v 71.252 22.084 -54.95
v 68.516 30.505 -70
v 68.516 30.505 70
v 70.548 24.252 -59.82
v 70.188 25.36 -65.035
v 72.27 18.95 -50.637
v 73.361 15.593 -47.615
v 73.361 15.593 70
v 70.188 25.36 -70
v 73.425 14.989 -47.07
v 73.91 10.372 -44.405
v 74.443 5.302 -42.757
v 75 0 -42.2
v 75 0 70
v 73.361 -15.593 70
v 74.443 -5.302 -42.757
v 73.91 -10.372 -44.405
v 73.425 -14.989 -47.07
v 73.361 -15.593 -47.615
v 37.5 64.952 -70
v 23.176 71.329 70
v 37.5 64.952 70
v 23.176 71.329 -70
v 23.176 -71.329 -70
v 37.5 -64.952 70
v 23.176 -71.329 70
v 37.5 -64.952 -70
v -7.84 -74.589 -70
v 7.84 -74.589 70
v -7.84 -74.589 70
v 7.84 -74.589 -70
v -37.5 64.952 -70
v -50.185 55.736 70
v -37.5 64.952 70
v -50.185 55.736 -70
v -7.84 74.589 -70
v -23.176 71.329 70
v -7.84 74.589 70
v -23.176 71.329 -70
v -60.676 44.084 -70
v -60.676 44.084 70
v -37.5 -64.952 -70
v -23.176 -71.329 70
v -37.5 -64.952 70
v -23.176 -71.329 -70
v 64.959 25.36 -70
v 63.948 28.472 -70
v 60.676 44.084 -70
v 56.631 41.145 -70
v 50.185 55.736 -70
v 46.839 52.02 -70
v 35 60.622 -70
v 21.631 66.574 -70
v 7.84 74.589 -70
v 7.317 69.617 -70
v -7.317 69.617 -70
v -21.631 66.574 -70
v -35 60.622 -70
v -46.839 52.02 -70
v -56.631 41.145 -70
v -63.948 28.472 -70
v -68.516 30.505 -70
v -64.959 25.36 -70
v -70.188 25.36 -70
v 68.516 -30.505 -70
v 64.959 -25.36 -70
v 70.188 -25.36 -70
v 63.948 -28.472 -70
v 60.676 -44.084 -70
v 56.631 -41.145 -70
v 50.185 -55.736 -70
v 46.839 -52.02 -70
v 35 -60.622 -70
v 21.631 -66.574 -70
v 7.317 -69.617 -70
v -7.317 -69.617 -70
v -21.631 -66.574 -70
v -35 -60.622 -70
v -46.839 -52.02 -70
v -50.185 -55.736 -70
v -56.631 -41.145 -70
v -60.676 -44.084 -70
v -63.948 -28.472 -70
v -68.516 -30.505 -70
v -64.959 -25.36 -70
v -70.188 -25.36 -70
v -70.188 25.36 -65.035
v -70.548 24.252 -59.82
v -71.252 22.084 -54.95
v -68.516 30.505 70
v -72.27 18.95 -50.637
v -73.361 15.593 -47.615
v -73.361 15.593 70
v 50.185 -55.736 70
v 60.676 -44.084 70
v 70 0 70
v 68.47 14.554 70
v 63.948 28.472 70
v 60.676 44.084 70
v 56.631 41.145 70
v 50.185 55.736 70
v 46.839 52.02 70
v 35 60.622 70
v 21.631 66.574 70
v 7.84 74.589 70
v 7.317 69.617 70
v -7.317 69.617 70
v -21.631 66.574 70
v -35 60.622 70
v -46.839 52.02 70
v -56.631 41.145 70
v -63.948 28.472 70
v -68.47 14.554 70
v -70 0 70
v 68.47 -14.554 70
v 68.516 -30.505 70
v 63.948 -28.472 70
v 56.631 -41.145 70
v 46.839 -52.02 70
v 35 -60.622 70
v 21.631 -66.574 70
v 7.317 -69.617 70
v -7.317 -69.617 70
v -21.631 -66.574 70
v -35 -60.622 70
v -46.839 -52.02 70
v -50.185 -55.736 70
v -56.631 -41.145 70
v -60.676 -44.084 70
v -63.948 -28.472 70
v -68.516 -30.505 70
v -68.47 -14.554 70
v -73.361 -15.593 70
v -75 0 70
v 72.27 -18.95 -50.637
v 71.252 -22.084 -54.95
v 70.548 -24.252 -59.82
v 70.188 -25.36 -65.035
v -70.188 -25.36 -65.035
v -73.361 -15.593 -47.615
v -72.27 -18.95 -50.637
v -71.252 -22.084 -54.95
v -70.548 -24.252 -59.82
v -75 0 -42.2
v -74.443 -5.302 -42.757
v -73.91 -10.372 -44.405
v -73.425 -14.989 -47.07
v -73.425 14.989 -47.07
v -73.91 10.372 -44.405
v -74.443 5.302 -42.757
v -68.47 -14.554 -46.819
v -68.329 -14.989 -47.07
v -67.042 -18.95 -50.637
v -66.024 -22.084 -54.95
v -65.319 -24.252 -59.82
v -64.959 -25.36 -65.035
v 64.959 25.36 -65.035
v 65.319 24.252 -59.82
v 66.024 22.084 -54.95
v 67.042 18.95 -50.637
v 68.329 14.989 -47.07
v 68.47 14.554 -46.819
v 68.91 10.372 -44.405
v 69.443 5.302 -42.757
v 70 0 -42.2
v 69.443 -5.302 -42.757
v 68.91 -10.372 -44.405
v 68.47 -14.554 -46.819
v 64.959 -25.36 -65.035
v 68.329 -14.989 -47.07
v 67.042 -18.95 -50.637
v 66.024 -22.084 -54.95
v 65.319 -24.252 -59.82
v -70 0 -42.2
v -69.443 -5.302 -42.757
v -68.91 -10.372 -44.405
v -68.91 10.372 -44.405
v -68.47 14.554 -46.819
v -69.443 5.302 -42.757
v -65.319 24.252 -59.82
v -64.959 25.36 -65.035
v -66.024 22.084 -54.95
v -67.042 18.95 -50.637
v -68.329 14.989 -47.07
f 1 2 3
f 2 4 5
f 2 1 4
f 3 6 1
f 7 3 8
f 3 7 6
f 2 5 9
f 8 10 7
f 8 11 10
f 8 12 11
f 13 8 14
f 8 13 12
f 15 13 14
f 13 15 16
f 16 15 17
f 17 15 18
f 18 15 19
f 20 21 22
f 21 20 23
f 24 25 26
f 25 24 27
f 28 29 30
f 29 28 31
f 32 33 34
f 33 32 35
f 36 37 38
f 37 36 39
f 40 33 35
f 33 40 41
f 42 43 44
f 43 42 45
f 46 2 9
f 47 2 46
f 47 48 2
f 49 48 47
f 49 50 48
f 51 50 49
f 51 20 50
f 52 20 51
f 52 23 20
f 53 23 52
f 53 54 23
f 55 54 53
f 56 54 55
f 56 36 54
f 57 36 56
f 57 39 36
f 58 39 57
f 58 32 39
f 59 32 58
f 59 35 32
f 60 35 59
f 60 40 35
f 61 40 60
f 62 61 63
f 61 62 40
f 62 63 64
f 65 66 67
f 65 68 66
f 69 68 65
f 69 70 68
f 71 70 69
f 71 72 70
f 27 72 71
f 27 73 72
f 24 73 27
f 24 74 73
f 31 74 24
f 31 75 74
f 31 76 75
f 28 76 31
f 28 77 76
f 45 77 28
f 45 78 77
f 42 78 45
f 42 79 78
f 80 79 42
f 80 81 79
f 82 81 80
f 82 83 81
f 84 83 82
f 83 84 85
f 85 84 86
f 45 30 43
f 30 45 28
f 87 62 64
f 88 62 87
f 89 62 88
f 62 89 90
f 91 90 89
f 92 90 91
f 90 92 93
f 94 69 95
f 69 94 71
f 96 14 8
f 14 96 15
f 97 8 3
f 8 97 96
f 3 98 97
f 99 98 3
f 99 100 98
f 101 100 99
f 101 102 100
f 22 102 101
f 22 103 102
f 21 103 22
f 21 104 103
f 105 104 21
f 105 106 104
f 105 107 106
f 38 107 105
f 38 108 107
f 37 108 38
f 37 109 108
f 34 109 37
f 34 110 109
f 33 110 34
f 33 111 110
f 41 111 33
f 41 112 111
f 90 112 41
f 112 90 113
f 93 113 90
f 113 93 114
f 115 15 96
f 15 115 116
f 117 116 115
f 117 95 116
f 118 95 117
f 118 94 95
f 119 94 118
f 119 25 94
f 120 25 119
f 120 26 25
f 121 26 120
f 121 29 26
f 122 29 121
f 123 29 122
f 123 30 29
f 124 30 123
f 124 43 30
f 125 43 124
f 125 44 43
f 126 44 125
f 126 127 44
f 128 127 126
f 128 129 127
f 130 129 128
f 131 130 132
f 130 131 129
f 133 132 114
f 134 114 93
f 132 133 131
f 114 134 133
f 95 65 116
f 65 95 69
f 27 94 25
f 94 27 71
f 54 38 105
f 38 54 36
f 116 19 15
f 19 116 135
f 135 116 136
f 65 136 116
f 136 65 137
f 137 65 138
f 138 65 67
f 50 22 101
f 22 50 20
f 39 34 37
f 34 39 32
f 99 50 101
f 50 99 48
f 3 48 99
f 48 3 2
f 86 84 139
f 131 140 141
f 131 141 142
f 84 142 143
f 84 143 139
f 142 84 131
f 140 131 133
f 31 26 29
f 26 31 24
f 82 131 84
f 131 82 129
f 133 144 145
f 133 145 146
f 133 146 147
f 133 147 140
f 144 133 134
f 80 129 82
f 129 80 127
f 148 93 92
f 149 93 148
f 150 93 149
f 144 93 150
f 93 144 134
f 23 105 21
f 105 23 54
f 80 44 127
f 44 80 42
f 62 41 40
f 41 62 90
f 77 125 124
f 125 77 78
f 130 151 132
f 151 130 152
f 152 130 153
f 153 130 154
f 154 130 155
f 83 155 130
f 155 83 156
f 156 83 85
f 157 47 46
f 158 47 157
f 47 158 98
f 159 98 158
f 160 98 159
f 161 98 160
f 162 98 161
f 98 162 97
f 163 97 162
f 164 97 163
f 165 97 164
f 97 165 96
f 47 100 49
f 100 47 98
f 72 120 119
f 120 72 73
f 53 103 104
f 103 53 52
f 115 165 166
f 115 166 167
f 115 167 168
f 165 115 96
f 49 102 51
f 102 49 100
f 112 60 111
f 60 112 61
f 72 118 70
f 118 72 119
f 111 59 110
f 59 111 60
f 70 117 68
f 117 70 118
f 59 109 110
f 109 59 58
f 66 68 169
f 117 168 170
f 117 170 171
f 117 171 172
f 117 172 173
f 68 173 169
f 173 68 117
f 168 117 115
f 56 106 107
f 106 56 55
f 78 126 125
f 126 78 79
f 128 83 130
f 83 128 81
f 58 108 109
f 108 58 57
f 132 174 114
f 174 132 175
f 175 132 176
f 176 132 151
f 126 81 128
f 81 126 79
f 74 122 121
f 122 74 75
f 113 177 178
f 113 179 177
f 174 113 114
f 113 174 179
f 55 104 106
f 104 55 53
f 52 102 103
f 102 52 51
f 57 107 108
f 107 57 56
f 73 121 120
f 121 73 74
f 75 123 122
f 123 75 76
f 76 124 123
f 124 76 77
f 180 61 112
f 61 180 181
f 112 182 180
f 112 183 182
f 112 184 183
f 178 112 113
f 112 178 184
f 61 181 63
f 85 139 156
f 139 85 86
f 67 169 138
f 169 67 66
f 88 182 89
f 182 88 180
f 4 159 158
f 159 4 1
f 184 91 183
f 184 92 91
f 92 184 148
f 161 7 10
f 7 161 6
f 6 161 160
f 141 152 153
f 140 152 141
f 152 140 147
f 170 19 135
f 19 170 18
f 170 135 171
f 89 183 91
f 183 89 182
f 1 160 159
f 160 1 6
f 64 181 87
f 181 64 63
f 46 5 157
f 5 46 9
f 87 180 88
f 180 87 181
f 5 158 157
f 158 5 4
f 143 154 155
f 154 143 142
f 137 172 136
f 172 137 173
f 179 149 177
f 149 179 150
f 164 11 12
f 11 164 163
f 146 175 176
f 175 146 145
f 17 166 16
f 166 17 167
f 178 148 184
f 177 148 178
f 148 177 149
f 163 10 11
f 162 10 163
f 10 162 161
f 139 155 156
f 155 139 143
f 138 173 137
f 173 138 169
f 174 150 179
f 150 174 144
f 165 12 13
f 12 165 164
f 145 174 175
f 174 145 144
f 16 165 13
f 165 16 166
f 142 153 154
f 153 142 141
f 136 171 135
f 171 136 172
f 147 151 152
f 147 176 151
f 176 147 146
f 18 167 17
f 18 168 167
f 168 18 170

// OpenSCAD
// file: settings.scad
// Common settings used by all scad files.

// ALL UNITS IN MILLIMETERS (MM)!!!

$fn = 30;//low-res but fast to render
//$fn = 50;//higher-res but slow to render

pi = 3.1415926535897932384626433832795;

max_footprint = 150; // 15x15 cm

bottom_clearance = 10;
bottom_clearance = 25.4/2+10;
//bottom_clearance = 30;

shell_alpha = 0.215;
//shell_alpha = 1.0;

tolerance = 0.5;

// Flat countersunk M2.5mm x 0.45mm machine screw.
screw_thread_diameter = 2.5;//2.8;//2.75;//2.4?
screw_thread_length = 5;//?
screw_head_diameter = 4.75; // M2.5
//screw_head_diameter = 5.2; // M3
screw_head_height = 1.5;//2;

screw_thread_diameter2 = 2;

unit_thickness = 5;
u = unit_thickness;

shell_thickness = unit_thickness;

// Show flags.
show_platform = 0;
show_head = 1;
show_head_shell = 0;
show_head_electronics_bb = 0;
show_battery = 1;
show_foot_cube = 0;
show_torso = 0;
show_motor = 0;
show_motor_plates = 1;
show_motor_inner_plates = 1;
show_motor_outer_plates = 1;
show_wheel = 0;//obsolete
show_tracks = 1;//
show_track_wheels = 1;
show_caster = 0;
show_rpi = 1;
show_vertical_plates = 1;//
show_horizontal_plates = 1;//
show_caster_plates = 0;//obsolete?
show_camera = 1;
show_screen = 0;
show_edge_mount = 1;
show_sonar_mount = 1;
show_recharge_mount = 1;
show_conduit = 1;
show_torso_shell = 1;
show_recharge_dock = 0;
show_head_tilt_axis = 0;
show_rpi_camera_axis = 0;
show_laser_axis = 0;

head_vertical_angle_tilt = 0;
//head_vertical_angle_tilt = 30;//max
//head_vertical_angle_tilt = 10;

torso_height = 120+20;

base_plate_diameter = max_footprint-unit_thickness*2;
base_plate_frame = 0;

head_height = 50;
head_offset_z = max_footprint/2;
head_middle_cutout = 85;

rpi_with_four_hats_and_clearance = 76;

qrd1114_w = 6.10;
qrd1114_l = 4.39;
qrd1114_h = 4.65;

dock_radius = 10;
dock_gripper_border = 2;
dock_gripper_instep = 0.9;
dock_gripper_cutout_tapper = 50;
dock_receiver_height = 5;

// Patriod Fuel+ 9000 mAh
battery_length = 90;
battery_width = 57;
battery_height = 23;
battery_offset_z = 30;//4;

wheel_diameter = 50;
wheel_offset_x = 65;
wheel_offset_z = wheel_diameter/2;
wheel_axle_diameter = 5;

//caster_diameter = 19.05; // 0.75 inches
caster_diameter = 25.45; // 1 inches
//caster_diameter = 15.875; // 5/8 inches
caster_holder_diameter = 30;//31;
caster_offset_y = base_plate_diameter/2 - caster_holder_diameter/2;

arduino_offset_x = 0;
arduino_offset_y = 0;
arduino_offset_z = 67;
arduino_offset_x2 = 0;
arduino_offset_y2 = -20;
arduino_offset_z2 = torso_height+bottom_clearance;

horizontal_plate_width = unit_thickness*8*2 - unit_thickness*2;
horizontal_plate_depth = unit_thickness*8*2;

vertical_plate_width = horizontal_plate_depth;
vertical_plate_height = unit_thickness*8;
vertical_plate_offset_x = wheel_offset_x-22.5;
vertical_plate_offset_z = vertical_plate_height/2 + unit_thickness/2;

vertical_battery_plate_height = 100 - 15;

caster_plate_width = horizontal_plate_width + unit_thickness*2;
caster_plate_mount_length = unit_thickness*4;
caster_plate_width_minor = caster_holder_diameter;

motor_switch_length = 20;
motor_switch_thickness = 6.5;
motor_switch_height = 11;
motor_switch_height_leads = 23;
motor_switch_on_height =  13.3;
motor_switch_hole_diameter = 2.5;
motor_switch_hole_offset_z = 6.5;//this plus diameter/2 is hole center from switch top
motor_switch_hole_spacing = 7.1;// holes are diameter/2 from this

motor_length = 60;
motor_width = 25;
motor_collar_width = 7;
motor_collar_height = 2.5;
motor_axle_width = 4;
motor_axle_height = 9.5;
motor_offset_x = 10;
//motor_offset_y = motor_width/2+5;
motor_offset_y = unit_thickness*3.5;
motor_offset_z = vertical_plate_height/2 - unit_thickness/2;//4;//30;
motor_mount_holes_dist = 17;
// motor countersink hole
motor_mount_holes_width = 3; // M3
motor_mount_holes_head_height = 2.2;
motor_mount_holes_head_width = 5.8;
motor_bearing_outer_diameter = 10;
motor_bearing_inner_diameter = 5.95;
motor_bearing_thickness = 2.5;

motor_unimount_idler_axle_d = screw_thread_diameter;
//motor_unimount_spacer_depth = 0.1;//too small
motor_unimount_spacer_depth = 0.5;

motor_arm_offset_y = -u*3;
motor_arm_offset_z = u*.5;

motor_plate_width = vertical_plate_width;
motor_plate_height = vertical_plate_height;
motor_plate_thickness = unit_thickness;
motor_plate_offset_z = vertical_plate_offset_z;

motor_plate_middle_thickness = 5;

wheel_hub_offset = u*3;

motor_hole_height_offset = -5;

nylon_spacer_outer_diameter = 6.35;
nylon_spacer_inner_diameter = 3.302;
nylon_spacer_length = 12.7;

track_width = unit_thickness*3;
track_offset_x = -50;
track_offset_z = .1;
//track_wheel_radius = 19;//original
track_wheel_radius = 14;
//track_wheel_hole_radius = (nylon_spacer_outer_diameter+1)/2;
track_wheel_hole_radius = motor_bearing_outer_diameter/2;

track_driver_hole_radius = (motor_axle_width)/2 + 0.1;
track_driver_set_screw_head_d = 4.1;
track_driver_set_screw_shaft_d = 2.4;
//track_wheel_width = 13.5;//original
track_wheel_width = u*2;
track_wheel_width_buffer = u*0.25;
track_offset = 3;        //distance from chassis
track_wheel_offset = track_offset;
//track_length = 250; // see tread_triangle.py, too big
//track_length = 240; // see tread_triangle.py
//track_length = 238; //inc/dec in 10 unit increments so notches match idlers
track_length = 228; //inc/dec in 10 unit increments so notches match idlers
track_radius = track_length/2/pi;
track_wheel_show_fancy = 1;
track_wheel_gap = track_wheel_width + track_wheel_width_buffer*2;
track_axle_bearing_diameter = motor_bearing_inner_diameter - 0.1;
track_tensioner_radius = 12;
track_nut_height = 3.5; //TODO
track_punchout_thickness = 0.25;//should be the same as the minimum layer thickness

head_slew_bearing_outer_diameter = 115;
head_slew_bearing_ring_thickness = 20;
head_slew_bearing_inner_diameter = head_slew_bearing_outer_diameter - head_slew_bearing_ring_thickness;
//head_slew_bearing_hole_diameter = head_slew_bearing_inner_diameter - head_slew_bearing_ring_thickness;
head_slew_bearing_hole_diameter = 12+tolerance; // slip ring https://www.adafruit.com/products/775
//head_slew_bearing_ball_diameter = 5;
head_slew_bearing_ball_diameter = 2.5; //u/2;
head_slew_bearing_height = u;//head_slew_bearing_ball_diameter*2;
head_slew_bearing_gap = 0.5;
head_slew_bearing_slew_gap = 0;
head_slew_bearing_gap_factor = 0.1;

neck_strut_width = u*7;
neck_strut_height = u*18;
neck_strut_spacing = u*8;

show_outer_race = 0;
show_inner_race_a = 1;
show_inner_race_b = 1;
show_balls = 0;
// main file
include <settings.scad>;

module make_torso_shell(){
    difference(){
        cylinder(h=torso_height, d=max_footprint, center=true);
        cylinder(h=torso_height+1, d=max_footprint-shell_thickness*2, center=true);
        
        translate([0,0,-(torso_height/2+bottom_clearance)+wheel_offset_z])
        hull(){
            rotate([0,90,0])
            cylinder(h=max_footprint+1, d=wheel_diameter+1, center=true);
            
            translate([0,0,-25])
            rotate([0,90,0])
            cylinder(h=max_footprint+1, d=wheel_diameter+1, center=true);
        }
    }
}

make_torso_shell();
